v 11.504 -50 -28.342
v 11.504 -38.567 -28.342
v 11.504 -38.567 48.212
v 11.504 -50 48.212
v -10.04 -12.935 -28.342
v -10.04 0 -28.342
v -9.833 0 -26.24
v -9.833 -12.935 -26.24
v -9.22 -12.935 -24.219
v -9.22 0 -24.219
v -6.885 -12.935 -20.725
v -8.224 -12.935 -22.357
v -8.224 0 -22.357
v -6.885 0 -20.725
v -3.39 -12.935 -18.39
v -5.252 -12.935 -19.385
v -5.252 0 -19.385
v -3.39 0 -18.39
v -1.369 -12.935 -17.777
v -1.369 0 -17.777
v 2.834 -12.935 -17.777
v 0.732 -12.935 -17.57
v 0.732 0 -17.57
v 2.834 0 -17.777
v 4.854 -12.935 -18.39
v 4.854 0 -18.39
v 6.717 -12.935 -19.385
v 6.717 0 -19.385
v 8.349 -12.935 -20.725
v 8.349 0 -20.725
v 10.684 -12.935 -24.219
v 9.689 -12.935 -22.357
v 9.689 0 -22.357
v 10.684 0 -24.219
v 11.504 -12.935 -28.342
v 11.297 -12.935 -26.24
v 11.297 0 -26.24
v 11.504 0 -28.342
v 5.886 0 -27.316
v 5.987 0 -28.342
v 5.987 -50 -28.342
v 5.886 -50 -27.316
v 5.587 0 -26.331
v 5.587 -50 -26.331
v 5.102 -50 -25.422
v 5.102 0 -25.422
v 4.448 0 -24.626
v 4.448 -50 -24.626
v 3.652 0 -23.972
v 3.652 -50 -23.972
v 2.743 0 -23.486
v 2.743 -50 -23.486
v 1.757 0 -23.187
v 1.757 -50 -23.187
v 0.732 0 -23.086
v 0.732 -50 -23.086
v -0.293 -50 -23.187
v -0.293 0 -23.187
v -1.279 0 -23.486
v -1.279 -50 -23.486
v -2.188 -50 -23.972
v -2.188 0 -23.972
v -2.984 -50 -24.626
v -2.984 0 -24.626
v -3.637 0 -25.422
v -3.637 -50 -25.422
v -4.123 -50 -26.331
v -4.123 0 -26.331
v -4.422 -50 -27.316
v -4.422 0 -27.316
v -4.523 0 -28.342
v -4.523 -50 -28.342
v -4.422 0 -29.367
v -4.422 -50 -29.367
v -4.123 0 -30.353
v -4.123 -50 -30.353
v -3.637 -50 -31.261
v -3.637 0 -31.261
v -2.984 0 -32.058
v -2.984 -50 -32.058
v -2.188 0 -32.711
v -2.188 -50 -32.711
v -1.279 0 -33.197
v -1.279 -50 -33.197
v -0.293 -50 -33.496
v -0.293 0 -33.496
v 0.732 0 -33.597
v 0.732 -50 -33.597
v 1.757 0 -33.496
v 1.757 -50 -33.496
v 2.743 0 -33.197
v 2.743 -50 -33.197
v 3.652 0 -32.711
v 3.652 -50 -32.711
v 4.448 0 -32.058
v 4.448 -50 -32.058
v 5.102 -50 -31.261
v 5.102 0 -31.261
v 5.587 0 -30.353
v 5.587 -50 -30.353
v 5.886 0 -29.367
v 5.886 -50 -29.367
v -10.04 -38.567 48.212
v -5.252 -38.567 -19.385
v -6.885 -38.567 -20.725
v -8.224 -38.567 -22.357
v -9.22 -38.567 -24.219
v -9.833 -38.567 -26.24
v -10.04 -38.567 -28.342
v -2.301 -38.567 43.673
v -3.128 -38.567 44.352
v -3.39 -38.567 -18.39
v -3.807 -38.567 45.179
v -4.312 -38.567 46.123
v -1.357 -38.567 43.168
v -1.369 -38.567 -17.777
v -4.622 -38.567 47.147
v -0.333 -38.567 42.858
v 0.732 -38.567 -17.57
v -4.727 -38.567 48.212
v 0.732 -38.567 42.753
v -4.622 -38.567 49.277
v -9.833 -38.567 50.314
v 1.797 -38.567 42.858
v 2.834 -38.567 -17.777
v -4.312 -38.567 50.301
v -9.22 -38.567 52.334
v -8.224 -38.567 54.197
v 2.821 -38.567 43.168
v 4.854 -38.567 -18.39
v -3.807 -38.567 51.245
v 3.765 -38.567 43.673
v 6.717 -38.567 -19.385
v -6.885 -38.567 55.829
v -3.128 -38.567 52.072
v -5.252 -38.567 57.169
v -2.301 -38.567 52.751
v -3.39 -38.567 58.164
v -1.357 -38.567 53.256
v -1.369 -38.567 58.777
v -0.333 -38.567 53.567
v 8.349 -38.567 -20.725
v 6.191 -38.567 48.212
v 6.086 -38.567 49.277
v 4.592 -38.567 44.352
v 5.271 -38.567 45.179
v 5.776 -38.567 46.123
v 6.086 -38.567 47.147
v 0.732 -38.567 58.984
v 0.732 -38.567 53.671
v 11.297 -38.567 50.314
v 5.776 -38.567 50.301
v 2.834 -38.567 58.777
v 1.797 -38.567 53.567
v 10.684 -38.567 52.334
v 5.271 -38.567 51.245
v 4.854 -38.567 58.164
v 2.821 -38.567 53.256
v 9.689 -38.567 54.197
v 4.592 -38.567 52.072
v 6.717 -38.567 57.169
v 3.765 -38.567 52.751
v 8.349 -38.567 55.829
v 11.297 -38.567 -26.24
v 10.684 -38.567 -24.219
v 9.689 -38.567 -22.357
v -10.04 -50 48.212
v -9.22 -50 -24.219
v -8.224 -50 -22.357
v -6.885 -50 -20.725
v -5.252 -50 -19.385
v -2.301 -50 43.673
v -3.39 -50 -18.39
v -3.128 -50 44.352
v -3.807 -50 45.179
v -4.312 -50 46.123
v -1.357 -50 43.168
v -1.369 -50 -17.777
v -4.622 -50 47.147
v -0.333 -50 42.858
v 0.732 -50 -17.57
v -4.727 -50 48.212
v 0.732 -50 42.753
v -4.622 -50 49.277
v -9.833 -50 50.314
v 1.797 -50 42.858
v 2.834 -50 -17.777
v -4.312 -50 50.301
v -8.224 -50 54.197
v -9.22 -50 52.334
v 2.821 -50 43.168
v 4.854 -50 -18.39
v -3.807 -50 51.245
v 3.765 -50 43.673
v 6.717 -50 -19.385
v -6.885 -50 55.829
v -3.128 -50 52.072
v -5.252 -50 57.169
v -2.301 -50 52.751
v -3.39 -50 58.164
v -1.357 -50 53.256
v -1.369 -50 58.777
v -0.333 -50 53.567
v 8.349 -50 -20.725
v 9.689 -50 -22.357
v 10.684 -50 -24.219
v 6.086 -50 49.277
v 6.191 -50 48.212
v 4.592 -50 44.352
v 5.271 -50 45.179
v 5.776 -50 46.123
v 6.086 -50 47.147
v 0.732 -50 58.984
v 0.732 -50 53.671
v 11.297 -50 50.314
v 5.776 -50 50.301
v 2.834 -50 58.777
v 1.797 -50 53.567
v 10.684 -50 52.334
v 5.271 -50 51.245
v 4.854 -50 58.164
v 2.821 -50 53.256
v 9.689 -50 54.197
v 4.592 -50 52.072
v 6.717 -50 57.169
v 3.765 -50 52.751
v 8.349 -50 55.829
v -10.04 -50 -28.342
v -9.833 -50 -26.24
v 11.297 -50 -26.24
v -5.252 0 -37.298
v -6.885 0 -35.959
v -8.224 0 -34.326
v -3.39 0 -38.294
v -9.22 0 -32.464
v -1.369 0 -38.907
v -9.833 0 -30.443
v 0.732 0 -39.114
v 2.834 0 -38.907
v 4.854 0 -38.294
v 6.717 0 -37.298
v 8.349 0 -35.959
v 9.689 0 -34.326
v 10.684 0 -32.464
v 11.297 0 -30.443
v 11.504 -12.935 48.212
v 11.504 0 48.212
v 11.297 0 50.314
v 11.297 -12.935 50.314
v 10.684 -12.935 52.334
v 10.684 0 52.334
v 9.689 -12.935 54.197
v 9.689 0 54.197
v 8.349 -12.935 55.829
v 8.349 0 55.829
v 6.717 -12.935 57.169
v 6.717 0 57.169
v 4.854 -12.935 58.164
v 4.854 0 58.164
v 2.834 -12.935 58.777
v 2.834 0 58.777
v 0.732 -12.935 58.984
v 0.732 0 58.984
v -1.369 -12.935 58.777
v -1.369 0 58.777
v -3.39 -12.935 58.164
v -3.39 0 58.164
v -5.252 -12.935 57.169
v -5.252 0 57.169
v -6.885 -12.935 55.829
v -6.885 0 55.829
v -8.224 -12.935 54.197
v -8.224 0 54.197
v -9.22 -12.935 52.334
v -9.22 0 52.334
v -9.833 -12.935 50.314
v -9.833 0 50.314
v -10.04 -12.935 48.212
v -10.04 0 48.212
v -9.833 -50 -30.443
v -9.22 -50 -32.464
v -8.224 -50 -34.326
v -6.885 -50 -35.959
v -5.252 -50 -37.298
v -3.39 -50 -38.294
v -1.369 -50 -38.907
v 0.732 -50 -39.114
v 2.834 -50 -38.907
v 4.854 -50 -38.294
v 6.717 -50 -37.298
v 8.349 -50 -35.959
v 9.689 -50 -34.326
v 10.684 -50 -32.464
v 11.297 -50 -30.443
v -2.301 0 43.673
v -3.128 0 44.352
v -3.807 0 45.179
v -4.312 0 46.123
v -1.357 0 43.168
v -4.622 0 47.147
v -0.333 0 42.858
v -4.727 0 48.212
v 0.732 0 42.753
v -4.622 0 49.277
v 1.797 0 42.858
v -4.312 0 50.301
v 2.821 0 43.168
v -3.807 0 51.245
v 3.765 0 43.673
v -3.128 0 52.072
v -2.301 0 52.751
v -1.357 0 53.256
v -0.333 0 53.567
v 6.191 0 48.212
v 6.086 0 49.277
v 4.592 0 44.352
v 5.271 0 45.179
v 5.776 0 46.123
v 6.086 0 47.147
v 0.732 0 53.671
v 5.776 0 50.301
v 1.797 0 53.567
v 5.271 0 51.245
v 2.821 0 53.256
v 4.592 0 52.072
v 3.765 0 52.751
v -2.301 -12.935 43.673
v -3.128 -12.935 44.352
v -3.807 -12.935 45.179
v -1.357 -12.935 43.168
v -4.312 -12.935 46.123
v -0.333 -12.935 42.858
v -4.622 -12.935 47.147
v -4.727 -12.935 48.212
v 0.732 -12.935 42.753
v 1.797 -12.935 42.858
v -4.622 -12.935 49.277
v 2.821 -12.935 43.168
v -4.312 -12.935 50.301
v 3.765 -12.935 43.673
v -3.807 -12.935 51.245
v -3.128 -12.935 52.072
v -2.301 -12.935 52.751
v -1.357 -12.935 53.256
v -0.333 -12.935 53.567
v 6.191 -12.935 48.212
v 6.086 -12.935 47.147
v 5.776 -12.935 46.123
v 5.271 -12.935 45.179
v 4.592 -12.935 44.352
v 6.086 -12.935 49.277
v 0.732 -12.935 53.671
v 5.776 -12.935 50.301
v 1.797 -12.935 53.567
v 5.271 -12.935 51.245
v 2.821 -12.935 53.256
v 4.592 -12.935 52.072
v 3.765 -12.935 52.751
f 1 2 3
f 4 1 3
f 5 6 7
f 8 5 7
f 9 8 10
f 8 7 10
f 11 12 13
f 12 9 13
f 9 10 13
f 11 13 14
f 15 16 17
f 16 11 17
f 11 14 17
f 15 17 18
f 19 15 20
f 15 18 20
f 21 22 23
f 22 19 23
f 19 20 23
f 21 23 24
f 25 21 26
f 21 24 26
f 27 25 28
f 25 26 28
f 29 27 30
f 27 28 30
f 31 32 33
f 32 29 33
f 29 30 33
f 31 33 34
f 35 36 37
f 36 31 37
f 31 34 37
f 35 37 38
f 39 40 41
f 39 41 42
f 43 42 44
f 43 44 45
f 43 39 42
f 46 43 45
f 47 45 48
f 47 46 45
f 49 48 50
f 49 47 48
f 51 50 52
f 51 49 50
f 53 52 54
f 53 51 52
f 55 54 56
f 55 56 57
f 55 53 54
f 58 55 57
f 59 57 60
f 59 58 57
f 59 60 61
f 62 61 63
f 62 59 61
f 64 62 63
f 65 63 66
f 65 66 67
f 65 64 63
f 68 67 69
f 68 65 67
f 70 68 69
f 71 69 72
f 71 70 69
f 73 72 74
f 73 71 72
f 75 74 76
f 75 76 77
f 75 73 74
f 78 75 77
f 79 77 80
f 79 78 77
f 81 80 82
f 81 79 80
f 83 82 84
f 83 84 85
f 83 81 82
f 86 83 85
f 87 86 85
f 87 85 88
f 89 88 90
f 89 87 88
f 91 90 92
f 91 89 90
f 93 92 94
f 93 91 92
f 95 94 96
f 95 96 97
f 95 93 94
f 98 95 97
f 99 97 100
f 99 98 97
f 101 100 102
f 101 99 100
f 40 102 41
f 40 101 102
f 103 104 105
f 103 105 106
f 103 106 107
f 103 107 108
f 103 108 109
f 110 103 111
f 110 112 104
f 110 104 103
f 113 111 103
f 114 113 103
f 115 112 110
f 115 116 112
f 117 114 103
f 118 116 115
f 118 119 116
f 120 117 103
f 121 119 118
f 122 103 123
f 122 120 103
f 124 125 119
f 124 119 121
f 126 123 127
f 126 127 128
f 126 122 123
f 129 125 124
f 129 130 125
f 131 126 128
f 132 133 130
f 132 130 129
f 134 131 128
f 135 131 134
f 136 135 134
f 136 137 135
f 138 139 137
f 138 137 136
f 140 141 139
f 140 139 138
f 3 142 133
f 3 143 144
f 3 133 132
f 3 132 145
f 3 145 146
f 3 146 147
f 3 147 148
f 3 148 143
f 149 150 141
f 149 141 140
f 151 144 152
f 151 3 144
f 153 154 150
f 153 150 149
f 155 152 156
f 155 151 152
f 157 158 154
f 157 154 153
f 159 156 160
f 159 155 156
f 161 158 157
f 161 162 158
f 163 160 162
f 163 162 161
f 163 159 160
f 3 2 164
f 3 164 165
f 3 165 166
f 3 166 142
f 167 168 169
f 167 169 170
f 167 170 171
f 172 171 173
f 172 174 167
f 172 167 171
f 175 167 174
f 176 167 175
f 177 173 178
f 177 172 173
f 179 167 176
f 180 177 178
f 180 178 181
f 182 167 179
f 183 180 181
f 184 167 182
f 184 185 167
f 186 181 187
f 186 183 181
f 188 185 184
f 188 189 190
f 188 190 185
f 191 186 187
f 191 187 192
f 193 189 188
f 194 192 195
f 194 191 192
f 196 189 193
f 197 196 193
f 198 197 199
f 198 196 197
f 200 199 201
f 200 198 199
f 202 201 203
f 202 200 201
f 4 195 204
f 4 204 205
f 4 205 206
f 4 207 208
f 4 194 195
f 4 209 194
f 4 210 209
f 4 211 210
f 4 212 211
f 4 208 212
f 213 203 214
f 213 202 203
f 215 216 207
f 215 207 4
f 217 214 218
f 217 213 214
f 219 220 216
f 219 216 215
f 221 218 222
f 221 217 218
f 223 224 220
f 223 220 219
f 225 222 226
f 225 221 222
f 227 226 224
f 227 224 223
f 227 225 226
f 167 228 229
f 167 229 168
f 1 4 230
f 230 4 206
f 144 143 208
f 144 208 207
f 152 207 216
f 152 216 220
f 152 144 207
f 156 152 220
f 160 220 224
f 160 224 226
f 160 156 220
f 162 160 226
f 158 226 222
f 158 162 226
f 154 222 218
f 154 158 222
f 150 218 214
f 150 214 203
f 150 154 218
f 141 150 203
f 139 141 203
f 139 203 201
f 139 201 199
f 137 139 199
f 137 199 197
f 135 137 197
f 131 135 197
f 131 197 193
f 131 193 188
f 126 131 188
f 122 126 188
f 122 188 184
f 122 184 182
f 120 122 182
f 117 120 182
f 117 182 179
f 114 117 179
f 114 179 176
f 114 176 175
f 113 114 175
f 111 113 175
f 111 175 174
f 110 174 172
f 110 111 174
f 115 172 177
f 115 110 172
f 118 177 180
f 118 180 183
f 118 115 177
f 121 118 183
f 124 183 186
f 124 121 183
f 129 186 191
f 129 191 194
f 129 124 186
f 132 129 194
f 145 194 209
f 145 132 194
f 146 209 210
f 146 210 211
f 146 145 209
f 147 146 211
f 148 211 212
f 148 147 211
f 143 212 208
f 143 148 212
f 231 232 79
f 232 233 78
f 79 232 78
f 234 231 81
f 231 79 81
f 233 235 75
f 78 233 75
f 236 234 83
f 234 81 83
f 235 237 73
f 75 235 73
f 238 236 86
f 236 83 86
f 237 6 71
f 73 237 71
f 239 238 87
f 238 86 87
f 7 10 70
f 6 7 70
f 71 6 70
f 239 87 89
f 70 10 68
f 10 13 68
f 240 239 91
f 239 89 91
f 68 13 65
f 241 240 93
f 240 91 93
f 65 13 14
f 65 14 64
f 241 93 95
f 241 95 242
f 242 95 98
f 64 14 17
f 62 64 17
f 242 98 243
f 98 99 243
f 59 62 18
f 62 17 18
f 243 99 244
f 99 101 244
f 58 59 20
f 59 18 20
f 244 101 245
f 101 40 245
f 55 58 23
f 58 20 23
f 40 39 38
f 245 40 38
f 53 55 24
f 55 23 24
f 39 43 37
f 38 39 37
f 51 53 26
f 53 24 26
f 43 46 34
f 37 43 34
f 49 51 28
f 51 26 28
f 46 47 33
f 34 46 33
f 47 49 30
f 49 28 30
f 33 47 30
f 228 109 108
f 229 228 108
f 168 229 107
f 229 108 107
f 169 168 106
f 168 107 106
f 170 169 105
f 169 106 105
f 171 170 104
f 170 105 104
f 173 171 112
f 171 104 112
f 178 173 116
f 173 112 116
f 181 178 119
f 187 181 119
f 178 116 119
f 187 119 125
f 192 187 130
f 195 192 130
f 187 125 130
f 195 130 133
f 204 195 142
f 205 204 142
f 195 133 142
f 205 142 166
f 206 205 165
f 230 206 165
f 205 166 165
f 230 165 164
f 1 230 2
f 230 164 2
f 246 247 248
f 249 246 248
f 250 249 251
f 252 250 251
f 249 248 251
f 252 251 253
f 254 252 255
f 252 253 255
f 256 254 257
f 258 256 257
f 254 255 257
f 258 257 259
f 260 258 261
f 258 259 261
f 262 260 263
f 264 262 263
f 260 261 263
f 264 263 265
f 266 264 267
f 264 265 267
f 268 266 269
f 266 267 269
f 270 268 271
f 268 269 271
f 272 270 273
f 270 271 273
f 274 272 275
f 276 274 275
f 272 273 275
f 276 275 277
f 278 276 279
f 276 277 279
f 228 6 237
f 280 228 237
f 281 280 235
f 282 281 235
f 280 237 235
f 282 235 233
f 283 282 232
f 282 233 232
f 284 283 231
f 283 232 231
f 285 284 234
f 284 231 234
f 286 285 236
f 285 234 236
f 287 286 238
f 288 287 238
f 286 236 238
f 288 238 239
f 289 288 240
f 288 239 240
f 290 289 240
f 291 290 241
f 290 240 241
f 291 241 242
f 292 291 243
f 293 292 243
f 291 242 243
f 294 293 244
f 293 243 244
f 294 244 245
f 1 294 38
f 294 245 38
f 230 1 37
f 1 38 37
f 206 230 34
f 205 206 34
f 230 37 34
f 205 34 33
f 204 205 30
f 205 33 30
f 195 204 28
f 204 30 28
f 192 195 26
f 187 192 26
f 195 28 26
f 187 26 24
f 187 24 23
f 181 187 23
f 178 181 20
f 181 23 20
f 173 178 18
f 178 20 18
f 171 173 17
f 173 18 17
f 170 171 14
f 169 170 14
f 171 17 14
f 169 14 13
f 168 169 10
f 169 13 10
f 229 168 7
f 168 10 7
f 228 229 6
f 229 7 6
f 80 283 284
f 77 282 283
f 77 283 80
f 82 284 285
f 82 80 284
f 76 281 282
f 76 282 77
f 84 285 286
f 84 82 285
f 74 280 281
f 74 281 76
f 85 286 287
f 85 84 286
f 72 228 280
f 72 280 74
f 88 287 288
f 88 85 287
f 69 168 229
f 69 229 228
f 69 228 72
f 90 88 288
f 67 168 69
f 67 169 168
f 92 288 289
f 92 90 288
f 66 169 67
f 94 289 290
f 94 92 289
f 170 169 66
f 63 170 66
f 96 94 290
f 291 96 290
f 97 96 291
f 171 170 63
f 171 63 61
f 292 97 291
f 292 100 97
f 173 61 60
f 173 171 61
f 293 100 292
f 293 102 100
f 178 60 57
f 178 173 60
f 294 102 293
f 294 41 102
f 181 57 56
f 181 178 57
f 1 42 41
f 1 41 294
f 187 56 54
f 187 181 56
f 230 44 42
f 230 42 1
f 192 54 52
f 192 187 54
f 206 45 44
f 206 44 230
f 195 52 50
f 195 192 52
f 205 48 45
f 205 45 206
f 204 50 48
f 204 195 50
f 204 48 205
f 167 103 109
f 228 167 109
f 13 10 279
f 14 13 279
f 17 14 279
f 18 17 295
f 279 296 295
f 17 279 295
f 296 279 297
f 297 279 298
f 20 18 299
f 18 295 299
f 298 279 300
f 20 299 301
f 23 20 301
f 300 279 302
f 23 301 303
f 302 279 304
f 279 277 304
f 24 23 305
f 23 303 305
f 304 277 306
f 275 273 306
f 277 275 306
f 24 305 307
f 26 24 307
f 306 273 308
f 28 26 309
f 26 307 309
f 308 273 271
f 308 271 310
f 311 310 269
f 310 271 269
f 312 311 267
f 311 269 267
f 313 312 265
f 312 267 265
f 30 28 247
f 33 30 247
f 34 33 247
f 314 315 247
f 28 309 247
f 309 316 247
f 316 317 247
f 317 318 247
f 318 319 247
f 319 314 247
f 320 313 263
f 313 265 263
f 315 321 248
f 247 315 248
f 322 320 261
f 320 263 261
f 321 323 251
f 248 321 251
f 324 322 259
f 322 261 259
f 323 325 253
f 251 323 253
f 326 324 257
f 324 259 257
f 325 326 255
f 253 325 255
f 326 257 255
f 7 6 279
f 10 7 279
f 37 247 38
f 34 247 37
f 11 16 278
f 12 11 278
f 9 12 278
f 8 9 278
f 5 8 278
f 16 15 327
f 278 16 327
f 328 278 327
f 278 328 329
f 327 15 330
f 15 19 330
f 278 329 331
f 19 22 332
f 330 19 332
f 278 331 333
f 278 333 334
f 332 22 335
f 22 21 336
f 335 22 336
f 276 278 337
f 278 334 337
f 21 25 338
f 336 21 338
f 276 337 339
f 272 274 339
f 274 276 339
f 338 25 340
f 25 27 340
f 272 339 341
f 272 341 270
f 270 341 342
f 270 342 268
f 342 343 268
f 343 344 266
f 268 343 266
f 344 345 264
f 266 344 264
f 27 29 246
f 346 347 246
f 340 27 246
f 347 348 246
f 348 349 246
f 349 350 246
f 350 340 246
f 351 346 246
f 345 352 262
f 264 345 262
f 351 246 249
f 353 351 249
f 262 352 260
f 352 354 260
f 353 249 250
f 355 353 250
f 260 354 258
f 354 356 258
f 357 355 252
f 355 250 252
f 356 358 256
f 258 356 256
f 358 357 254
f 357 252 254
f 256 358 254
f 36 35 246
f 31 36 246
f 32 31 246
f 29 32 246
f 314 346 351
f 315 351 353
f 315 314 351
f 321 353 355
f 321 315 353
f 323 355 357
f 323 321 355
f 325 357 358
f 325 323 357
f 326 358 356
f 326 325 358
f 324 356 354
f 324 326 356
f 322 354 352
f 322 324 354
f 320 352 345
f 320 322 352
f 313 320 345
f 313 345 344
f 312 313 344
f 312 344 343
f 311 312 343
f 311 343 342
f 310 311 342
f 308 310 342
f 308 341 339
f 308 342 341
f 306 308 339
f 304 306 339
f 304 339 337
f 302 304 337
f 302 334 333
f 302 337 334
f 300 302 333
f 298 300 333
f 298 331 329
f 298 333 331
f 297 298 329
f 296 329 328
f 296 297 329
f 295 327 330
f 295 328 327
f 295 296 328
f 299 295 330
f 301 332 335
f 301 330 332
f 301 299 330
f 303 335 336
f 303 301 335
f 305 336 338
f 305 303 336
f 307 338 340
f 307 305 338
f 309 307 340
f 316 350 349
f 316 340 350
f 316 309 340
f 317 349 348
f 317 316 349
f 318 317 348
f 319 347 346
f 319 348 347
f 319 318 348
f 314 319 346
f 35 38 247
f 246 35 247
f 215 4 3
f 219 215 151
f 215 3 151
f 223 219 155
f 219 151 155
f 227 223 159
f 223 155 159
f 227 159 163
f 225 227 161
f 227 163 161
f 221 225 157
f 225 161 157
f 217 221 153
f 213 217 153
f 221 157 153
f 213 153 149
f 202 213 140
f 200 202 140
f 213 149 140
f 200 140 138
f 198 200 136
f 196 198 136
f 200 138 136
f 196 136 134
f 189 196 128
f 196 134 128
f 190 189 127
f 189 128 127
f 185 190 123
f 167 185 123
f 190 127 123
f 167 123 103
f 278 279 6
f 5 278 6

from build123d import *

# Parameters (mm, degrees)
F0_R          = 5.4593234286
F4_DEPTH      = 50
F5_W          = 25.6320154294
F5_H          = 97.1445217729
F6_DEPTH      = 25
F6_DEPTH_BACK = 25
F0_R_2        = 5.255163488
F7_DEPTH      = 50


# Not quite as in the source:
# - a feature of the source that left no trace in its solid (it failed there, or was rolled back) is left out


with BuildPart() as f4:
    # F0 (on Front) → F4 (new body)
    with BuildSketch(Plane.XZ):
        with BuildLine():
            Line((-10.0398408249, 48.2121519744), (-10.0398408249, -28.3416360617))
            ThreePointArc((-10.0398408249, -28.3416360617), (0.7320712321, -17.5697240047), (11.503983289, -28.3416360617))
            Line((11.503983289, -28.3416360617), (11.503983289, 48.2121519744))
            ThreePointArc((11.503983289, 48.2121519744), (0.7320712321, 58.9840640314), (-10.0398408249, 48.2121519744))
        make_face()
        with Locations((0.7320712321, 48.2121519744)):
            Circle(F0_R, mode=Mode.SUBTRACT)
    extrude(amount=F4_DEPTH)

    # F5 (on Right) → F6 (cut, two sides)
    with BuildSketch(Plane.YZ) as f6_sk:
        with Locations((-25.7514272816, 18.2514749467)):
            Rectangle(F5_W, F5_H)
    extrude(amount=F6_DEPTH, mode=Mode.SUBTRACT)
    extrude(f6_sk.sketch, amount=-F6_DEPTH_BACK, mode=Mode.SUBTRACT)


with BuildPart() as f7:
    # F0 (on Front) → F7 (new body)
    with BuildSketch(Plane.XZ):
        with BuildLine():
            ThreePointArc((11.503983289, -28.3416360617), (0.7320712321, -17.5697240047), (-10.0398408249, -28.3416360617))
            ThreePointArc((-10.0398408249, -28.3416360617), (0.7320712321, -39.1135481186), (11.503983289, -28.3416360617))
        make_face()
        with Locations((0.7320712321, -28.3416360617)):
            Circle(F0_R_2, mode=Mode.SUBTRACT)
    extrude(amount=F7_DEPTH)


solid = Compound([f4.part, f7.part])
